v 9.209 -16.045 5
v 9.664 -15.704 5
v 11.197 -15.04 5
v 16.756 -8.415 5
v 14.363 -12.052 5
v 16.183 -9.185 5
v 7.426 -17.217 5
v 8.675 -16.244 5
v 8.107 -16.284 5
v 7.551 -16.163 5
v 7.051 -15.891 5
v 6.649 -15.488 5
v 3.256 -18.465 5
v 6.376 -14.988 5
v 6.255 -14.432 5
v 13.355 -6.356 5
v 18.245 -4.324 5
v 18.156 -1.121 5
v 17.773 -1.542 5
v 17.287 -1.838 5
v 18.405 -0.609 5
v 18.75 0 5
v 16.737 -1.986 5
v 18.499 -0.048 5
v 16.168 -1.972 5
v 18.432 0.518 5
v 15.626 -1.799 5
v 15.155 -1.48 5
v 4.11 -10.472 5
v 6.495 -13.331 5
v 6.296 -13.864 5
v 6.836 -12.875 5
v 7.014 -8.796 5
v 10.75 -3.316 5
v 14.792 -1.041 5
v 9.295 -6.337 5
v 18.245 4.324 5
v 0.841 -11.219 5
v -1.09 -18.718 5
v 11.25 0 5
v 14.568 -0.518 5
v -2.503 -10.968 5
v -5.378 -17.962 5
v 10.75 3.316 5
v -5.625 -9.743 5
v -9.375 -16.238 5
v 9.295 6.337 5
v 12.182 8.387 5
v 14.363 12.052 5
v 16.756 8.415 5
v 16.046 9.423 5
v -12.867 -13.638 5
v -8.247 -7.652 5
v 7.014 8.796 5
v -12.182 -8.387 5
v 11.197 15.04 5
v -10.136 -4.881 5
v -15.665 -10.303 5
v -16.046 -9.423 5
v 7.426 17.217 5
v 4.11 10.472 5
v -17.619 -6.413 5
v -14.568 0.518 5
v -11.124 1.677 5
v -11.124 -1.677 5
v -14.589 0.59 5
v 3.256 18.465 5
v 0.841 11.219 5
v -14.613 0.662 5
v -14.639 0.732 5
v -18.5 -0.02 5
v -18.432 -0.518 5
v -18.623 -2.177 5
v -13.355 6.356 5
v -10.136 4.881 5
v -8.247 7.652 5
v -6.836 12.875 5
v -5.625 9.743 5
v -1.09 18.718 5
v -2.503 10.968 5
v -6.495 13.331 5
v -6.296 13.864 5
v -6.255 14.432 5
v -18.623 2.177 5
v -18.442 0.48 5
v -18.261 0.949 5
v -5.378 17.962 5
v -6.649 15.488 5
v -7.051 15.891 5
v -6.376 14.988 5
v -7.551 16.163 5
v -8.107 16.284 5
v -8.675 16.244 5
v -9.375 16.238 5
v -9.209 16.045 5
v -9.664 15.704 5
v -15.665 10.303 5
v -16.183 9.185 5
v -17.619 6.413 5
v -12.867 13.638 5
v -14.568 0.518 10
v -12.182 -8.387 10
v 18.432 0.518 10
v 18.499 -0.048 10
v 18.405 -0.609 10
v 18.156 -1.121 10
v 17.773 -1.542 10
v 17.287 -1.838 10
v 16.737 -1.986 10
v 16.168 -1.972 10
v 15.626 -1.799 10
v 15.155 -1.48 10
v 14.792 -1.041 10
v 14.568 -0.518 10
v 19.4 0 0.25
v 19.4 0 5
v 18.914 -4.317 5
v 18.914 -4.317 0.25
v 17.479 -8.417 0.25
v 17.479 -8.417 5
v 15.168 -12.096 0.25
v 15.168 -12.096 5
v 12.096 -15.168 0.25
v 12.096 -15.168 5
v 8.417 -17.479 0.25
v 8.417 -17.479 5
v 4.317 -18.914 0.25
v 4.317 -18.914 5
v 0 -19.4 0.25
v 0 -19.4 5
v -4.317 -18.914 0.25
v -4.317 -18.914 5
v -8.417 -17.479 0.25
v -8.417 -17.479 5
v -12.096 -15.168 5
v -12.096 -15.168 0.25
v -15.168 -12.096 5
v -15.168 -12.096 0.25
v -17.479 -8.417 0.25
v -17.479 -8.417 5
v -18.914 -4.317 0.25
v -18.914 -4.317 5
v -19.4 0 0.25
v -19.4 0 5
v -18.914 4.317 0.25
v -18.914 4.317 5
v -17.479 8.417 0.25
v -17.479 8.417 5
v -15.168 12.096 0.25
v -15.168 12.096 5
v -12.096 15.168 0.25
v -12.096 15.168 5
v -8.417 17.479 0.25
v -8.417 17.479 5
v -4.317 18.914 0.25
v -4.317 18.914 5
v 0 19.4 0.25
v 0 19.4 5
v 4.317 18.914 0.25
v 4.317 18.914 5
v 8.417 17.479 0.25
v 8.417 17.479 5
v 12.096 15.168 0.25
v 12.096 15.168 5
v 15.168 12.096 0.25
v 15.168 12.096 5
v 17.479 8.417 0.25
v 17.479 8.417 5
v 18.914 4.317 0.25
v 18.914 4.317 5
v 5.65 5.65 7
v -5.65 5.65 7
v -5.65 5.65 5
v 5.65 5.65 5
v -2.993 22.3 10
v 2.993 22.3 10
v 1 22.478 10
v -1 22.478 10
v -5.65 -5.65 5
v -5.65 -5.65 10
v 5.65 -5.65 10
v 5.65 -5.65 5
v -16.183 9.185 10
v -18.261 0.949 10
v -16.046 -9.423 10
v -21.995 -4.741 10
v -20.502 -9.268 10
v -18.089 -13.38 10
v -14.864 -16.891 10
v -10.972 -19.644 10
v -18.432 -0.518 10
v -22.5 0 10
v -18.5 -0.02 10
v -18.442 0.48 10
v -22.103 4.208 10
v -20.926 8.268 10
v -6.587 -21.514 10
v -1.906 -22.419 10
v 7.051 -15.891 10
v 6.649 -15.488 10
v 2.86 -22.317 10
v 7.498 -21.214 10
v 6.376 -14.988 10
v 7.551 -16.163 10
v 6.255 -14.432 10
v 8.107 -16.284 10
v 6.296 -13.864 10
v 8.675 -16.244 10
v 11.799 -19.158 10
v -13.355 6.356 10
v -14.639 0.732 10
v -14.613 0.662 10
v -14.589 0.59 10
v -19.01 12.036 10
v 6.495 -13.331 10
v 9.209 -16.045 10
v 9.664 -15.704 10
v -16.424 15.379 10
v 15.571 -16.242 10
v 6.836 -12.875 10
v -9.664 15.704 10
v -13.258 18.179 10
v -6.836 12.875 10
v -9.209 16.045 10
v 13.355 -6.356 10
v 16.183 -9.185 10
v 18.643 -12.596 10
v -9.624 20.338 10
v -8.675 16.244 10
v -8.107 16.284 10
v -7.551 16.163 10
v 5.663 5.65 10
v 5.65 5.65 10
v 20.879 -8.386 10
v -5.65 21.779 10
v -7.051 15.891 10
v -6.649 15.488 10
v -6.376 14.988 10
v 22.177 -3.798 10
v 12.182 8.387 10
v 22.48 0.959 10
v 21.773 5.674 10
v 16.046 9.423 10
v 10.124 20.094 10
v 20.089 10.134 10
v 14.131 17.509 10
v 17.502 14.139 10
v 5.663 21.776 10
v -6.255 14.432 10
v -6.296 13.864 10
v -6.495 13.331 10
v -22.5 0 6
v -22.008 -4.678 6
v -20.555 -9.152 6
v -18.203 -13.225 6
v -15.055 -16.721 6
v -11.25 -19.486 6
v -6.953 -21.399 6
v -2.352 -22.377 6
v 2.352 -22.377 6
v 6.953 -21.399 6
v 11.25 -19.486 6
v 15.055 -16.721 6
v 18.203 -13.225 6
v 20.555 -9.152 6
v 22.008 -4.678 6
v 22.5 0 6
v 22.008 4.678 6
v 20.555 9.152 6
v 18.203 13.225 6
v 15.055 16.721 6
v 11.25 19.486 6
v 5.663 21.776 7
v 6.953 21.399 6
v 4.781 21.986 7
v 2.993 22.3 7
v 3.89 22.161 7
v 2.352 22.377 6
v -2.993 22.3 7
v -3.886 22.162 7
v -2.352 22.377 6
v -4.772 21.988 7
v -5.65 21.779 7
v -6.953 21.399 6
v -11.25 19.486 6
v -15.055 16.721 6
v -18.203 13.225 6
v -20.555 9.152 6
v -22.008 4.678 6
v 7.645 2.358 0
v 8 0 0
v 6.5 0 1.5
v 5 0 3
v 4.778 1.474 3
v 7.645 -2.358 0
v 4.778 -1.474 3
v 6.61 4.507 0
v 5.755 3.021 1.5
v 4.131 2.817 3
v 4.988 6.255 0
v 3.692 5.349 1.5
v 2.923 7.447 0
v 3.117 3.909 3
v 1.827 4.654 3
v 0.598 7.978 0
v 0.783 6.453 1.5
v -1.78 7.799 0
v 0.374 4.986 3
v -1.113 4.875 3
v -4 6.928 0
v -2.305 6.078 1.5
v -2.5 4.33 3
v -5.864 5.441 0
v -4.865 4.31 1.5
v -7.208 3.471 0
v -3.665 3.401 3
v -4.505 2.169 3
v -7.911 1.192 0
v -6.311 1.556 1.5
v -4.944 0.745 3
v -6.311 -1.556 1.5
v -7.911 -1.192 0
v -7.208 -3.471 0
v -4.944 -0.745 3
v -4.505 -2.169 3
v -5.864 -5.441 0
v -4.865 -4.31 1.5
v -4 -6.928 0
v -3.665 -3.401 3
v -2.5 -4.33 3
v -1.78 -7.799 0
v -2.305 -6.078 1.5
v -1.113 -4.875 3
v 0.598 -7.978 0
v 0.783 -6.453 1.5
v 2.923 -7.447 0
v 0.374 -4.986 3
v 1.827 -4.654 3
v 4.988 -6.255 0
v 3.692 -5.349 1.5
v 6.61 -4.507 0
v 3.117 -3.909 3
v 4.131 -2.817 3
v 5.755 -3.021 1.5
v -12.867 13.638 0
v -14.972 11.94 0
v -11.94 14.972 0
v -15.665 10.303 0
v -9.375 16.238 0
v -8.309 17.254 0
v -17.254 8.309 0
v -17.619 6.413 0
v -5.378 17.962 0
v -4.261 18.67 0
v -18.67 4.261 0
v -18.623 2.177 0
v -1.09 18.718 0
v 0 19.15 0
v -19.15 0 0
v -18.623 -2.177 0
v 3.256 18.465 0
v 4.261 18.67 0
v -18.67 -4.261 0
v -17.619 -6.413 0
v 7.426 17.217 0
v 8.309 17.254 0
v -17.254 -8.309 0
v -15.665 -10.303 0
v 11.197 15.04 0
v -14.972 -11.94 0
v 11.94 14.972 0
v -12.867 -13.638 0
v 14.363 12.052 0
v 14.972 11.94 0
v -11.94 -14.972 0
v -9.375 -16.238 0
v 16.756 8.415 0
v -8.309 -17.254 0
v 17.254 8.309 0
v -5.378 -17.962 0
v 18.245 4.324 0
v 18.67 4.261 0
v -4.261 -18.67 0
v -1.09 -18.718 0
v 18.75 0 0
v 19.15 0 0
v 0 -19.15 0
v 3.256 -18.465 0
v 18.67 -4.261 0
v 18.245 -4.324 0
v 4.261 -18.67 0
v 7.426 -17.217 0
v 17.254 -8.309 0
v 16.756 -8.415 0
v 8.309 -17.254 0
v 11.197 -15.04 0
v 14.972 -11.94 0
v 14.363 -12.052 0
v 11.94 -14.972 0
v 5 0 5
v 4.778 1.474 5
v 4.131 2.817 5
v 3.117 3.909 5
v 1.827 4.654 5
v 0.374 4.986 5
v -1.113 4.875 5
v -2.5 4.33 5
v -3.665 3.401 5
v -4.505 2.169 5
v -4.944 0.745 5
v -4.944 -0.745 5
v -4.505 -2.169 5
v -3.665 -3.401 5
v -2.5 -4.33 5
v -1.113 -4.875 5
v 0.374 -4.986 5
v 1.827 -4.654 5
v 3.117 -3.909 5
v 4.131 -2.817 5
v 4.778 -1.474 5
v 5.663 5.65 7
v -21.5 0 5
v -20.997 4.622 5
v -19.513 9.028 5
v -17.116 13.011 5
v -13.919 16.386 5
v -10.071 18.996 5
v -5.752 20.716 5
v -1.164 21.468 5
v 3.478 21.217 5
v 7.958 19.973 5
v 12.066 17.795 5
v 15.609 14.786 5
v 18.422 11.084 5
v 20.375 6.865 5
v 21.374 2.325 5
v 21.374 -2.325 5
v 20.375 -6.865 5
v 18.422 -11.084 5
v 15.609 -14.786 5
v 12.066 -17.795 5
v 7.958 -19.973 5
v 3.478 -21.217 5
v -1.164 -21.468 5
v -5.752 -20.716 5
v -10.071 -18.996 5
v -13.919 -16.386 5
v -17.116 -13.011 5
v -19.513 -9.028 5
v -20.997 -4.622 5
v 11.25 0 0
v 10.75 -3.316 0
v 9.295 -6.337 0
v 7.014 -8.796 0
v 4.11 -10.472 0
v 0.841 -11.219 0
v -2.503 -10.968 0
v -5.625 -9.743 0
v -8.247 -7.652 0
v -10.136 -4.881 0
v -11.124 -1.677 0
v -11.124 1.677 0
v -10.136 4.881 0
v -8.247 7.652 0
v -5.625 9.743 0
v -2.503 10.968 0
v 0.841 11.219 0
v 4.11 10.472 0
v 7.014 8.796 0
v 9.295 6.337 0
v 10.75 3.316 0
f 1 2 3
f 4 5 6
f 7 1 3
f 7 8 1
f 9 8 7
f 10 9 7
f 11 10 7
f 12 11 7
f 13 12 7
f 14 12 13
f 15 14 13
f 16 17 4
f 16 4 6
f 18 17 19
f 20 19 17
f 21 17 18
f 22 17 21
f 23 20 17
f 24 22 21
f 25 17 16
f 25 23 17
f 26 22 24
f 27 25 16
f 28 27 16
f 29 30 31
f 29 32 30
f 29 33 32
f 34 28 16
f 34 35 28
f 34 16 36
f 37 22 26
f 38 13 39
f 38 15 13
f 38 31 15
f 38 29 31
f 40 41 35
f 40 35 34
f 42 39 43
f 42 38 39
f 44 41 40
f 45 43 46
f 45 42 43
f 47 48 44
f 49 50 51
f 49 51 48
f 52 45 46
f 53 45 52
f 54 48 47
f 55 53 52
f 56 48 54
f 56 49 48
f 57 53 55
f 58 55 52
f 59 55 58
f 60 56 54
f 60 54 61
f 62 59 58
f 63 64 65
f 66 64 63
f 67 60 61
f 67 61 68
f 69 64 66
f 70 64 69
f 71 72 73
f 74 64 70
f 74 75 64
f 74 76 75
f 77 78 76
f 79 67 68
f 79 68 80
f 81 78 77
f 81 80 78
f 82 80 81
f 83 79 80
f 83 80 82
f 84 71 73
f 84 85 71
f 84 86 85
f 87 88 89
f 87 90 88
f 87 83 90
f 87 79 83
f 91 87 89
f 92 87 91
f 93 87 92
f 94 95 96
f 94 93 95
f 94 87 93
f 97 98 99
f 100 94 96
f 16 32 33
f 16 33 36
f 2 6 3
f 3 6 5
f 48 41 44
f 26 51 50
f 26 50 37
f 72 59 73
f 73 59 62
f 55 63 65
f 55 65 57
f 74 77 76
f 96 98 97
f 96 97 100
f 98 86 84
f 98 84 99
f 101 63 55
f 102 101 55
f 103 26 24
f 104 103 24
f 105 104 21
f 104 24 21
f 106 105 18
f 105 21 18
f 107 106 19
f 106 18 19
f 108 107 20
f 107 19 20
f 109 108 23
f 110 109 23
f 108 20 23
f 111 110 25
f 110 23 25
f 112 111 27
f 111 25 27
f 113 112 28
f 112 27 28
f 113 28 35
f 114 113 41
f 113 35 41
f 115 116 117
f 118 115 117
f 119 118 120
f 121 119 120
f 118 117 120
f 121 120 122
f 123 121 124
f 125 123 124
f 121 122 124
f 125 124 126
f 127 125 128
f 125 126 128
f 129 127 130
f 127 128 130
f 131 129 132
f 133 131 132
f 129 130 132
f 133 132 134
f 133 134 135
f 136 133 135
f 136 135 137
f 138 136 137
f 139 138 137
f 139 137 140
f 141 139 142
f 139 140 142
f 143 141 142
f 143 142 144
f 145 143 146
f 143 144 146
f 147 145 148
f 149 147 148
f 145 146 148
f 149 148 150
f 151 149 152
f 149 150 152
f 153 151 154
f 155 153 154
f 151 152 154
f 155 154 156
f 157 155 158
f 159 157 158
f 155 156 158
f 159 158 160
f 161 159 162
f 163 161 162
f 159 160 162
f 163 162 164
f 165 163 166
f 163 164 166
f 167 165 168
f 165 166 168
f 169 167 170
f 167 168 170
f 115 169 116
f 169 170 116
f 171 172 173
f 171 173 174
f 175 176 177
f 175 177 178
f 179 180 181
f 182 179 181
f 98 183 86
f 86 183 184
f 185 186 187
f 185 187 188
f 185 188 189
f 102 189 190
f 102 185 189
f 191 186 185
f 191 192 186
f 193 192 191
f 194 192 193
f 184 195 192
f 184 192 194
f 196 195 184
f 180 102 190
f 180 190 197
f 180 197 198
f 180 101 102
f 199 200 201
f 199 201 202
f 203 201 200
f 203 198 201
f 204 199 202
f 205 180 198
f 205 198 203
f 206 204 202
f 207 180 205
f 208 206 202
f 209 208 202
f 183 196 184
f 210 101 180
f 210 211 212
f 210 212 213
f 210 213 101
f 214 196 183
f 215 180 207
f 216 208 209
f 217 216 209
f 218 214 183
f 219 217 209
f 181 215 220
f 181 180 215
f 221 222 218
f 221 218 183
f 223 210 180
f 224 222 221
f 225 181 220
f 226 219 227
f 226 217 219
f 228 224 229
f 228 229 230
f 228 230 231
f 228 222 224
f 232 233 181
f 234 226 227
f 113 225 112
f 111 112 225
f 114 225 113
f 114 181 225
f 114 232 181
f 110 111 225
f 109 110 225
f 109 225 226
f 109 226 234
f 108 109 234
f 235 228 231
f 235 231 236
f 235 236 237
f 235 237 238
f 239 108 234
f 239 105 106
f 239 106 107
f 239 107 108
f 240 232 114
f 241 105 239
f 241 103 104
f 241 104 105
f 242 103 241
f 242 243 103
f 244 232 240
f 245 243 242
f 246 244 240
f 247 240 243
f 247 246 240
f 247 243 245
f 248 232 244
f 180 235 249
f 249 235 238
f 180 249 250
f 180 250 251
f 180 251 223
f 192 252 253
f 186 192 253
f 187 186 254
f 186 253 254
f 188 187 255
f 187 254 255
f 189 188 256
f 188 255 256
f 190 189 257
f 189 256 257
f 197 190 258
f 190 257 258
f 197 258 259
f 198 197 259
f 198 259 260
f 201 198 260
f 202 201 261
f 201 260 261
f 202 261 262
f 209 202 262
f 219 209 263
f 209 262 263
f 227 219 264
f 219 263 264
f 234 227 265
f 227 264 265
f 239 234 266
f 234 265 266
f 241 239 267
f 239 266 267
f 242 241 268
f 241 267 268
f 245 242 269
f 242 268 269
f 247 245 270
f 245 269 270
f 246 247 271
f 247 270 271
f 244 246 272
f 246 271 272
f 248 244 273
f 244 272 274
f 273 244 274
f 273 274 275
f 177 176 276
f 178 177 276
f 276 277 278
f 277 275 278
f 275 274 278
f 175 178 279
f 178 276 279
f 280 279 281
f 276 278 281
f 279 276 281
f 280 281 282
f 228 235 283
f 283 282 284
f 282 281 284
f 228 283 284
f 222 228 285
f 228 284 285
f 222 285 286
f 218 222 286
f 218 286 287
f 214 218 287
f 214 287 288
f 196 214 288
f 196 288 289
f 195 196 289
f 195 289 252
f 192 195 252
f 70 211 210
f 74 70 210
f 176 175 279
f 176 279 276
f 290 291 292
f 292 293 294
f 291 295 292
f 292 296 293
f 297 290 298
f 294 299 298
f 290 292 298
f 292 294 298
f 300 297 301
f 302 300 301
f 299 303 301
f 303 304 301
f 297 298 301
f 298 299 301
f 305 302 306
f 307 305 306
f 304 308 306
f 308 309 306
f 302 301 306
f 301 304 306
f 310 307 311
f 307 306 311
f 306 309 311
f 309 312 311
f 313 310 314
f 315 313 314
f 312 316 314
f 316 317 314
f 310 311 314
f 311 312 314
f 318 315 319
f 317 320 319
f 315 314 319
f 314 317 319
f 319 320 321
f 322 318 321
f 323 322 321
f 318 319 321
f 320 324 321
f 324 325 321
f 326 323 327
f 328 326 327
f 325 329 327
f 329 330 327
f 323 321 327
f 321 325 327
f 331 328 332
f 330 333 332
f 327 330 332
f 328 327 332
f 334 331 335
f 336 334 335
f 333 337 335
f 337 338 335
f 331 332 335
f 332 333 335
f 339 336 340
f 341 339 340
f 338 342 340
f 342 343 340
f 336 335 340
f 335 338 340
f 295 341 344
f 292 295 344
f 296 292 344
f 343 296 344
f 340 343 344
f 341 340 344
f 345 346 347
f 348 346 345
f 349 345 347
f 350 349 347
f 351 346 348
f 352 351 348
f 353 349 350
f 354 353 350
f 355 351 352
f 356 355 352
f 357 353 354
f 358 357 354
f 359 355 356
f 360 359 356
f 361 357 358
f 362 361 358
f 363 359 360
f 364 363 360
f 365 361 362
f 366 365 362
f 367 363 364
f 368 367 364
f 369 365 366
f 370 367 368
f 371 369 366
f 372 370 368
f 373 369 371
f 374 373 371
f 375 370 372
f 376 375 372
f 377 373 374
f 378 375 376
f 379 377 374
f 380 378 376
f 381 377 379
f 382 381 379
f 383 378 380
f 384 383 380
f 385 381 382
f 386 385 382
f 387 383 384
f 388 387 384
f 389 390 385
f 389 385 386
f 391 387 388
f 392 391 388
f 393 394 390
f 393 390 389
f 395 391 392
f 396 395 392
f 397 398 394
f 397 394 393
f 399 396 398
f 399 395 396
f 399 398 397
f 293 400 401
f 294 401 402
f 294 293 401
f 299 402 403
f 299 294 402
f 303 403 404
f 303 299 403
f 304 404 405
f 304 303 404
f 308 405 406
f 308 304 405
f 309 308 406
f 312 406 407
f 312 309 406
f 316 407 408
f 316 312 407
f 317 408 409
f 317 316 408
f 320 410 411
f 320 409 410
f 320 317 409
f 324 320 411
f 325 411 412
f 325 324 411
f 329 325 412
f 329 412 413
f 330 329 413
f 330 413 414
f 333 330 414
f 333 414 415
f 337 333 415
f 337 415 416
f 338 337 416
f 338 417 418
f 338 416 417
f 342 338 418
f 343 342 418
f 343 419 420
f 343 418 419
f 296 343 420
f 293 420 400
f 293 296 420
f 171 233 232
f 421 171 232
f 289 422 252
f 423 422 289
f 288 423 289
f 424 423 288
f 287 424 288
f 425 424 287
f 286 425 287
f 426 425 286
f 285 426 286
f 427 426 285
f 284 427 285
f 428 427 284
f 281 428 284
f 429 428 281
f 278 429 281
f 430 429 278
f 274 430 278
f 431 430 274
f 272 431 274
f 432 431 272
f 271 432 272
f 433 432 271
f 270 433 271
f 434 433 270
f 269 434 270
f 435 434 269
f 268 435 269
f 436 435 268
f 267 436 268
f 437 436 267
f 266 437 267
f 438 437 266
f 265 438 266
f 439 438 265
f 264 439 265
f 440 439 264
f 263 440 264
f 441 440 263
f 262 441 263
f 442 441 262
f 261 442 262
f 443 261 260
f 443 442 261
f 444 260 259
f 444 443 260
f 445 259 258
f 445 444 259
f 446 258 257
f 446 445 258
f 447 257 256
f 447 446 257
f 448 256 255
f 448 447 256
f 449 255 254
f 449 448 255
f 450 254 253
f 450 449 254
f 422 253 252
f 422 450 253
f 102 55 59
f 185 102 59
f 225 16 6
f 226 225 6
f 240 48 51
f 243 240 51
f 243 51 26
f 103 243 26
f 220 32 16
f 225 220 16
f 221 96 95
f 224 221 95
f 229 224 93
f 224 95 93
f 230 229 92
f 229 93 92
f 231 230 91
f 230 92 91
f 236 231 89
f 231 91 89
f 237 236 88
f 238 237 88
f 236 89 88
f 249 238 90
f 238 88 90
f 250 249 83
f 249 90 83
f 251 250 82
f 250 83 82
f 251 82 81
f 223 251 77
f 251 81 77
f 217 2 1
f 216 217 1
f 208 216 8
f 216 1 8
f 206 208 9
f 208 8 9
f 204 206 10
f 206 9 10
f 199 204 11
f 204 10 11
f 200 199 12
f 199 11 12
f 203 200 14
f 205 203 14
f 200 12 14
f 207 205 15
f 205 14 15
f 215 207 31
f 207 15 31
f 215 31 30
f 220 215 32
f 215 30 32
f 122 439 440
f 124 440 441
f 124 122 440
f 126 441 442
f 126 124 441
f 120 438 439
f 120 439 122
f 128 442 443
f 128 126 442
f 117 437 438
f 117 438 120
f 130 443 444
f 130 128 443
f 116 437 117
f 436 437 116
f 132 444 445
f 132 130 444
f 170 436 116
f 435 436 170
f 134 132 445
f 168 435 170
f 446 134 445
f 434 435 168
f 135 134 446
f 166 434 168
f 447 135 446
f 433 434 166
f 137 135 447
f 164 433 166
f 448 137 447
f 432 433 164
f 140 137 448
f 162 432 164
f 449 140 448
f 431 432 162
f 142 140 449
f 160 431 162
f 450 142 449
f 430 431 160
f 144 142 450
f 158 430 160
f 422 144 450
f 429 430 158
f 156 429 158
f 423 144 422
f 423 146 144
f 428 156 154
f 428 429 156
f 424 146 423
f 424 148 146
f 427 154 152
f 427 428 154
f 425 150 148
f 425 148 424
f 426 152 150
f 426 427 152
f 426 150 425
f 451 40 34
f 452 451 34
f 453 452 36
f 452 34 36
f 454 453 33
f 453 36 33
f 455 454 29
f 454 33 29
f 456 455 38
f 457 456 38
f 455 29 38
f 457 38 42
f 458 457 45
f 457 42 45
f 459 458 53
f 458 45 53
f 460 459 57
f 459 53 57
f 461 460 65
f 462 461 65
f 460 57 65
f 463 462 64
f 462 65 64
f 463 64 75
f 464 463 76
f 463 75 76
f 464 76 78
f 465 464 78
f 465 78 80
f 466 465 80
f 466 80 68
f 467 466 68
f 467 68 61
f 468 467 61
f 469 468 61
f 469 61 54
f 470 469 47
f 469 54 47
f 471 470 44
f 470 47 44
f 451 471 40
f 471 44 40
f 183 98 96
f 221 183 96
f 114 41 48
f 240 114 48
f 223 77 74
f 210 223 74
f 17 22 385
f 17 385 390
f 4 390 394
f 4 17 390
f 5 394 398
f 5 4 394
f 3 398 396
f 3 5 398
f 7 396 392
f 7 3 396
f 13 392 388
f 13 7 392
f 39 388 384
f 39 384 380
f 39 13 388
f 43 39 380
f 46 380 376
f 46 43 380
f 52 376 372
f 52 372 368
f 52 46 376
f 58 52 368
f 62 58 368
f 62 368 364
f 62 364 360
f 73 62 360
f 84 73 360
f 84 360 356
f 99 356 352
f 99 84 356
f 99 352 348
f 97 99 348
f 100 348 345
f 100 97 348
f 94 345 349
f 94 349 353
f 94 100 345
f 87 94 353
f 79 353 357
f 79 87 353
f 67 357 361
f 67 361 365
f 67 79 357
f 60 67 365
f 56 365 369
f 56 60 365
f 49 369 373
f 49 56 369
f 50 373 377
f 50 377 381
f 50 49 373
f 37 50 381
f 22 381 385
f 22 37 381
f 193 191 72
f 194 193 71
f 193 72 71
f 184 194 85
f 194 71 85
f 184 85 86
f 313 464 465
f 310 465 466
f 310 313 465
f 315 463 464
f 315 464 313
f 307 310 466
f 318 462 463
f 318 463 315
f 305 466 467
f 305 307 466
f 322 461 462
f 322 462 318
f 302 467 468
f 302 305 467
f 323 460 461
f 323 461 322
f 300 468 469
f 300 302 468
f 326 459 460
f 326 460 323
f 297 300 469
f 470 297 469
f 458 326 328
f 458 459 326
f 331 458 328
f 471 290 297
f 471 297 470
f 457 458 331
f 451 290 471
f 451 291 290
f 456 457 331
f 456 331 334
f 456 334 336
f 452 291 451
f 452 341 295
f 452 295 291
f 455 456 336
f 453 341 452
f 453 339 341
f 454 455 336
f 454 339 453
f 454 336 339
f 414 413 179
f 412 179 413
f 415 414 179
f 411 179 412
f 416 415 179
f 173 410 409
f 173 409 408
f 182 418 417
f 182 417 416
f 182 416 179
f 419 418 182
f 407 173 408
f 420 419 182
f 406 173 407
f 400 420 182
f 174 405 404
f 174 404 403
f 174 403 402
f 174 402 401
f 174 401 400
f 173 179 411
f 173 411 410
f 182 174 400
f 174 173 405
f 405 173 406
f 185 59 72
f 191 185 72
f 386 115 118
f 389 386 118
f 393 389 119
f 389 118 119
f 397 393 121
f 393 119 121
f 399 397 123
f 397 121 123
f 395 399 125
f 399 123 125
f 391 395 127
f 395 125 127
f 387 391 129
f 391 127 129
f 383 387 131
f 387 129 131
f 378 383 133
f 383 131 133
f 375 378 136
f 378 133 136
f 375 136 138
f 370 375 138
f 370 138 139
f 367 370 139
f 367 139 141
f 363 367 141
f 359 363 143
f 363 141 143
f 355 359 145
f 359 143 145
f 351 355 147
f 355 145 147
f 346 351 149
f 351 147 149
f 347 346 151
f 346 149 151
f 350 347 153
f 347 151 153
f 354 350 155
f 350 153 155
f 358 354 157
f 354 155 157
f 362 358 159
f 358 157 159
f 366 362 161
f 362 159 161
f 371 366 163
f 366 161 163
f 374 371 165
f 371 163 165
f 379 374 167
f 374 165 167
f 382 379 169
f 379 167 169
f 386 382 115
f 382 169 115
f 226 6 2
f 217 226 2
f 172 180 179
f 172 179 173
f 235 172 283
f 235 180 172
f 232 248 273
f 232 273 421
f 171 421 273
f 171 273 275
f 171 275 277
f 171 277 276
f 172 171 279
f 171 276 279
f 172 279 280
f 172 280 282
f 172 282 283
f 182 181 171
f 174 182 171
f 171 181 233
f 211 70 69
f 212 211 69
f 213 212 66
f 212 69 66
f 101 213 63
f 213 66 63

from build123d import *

# Parameters (mm, degrees)
SKETCH1_R           = 9.8
SKETCH1_R_2         = 5
BOSS_EXTRUDE1_DEPTH = 10
SKETCH2_W           = 11.3
SKETCH2_H           = 11.3
CUT_EXTRUDE1_DEPTH  = 5
SKETCH3_W           = 11.313408722
SKETCH3_H           = 4.707055676
CUT_EXTRUDE2_DEPTH  = 3
SKETCH4_W           = 5.404805584
SKETCH4_H           = 18.076359344
SKETCH4_W_2         = 5.663408722
SKETCH4_H_2         = 17.947057775
CUT_EXTRUDE3_DEPTH  = 3
CHAMFER1_SIZE       = 3
SKETCH5_R           = 22.5
SKETCH5_R_2         = 9.8
BOSS_EXTRUDE2_DEPTH = 1
SKETCH6_R           = 11.25
SKETCH6_R_2         = 9.8
BOSS_EXTRUDE3_DEPTH = 5
SKETCH7_R           = 19.4
SKETCH7_R_2         = 18.75
BOSS_EXTRUDE4_DEPTH = 5
CHAMFER2_SIZE       = 0.25
SKETCH9_R           = 22.5
SKETCH9_R_2         = 9.8
BOSS_EXTRUDE5_DEPTH = 4
SKETCH10_W          = 11.313408722
SKETCH10_H          = 16.65
CUT_EXTRUDE5_DEPTH  = 3
CUT_EXTRUDE4_DEPTH  = 33.210246817
CIRPATTERN1_COUNT   = 6
SKETCH12_W          = 2.936696108
SKETCH12_H          = 13.215132487
SKETCH12_W_2        = 3.332020584
SKETCH12_H_2        = 13.328082337
BOSS_EXTRUDE6_DEPTH = 3
CHAMFER3_SIZE       = 1
CUT_EXTRUDE6_DEPTH  = 10
BOSS_EXTRUDE7_DEPTH = 2
BOSS_EXTRUDE8_DEPTH = 5
BOSS_EXTRUDE9_DEPTH = 5


with BuildPart() as part:
    # Sketch1 → Boss-Extrude1 (new body)
    with BuildSketch(Plane.XY):
        Circle(SKETCH1_R)
        Circle(SKETCH1_R_2, mode=Mode.SUBTRACT)
    extrude(amount=BOSS_EXTRUDE1_DEPTH)

    # Sketch2 → Cut-Extrude1 (cut)
    with BuildSketch(Plane.XY.offset(10)):
        Rectangle(SKETCH2_W, SKETCH2_H)
    extrude(amount=-CUT_EXTRUDE1_DEPTH, mode=Mode.SUBTRACT)

    # Sketch3 → Cut-Extrude2 (cut)
    with BuildSketch(Plane.XY.offset(10)):
        with Locations((0.006704361, 8.003527838)):
            Rectangle(SKETCH3_W, SKETCH3_H)
    extrude(amount=-CUT_EXTRUDE2_DEPTH, mode=Mode.SUBTRACT)

    # Sketch4 → Cut-Extrude3 (cut)
    with BuildSketch(Plane.XY.offset(10)):
        with Locations((-10.5897985, 0)):
            Rectangle(SKETCH4_W, SKETCH4_H)
        with Locations((10.615658814, 0.064650784)):
            Rectangle(SKETCH4_W_2, SKETCH4_H_2)
    extrude(amount=-CUT_EXTRUDE3_DEPTH, mode=Mode.SUBTRACT)

    # Chamfer1
    chamfer1_edges = [part.edges().sort_by_distance(p)[0] for p in [
        (-5, 0, 0),
    ]]
    chamfer(chamfer1_edges, length=CHAMFER1_SIZE)

    # Sketch5 → Boss-Extrude2 (add)
    with BuildSketch(Plane(origin=(0, 0, 5), x_dir=(-1, 0, 0), z_dir=(0, 0, -1))):
        Circle(SKETCH5_R)
        Circle(SKETCH5_R_2, mode=Mode.SUBTRACT)
    extrude(amount=-BOSS_EXTRUDE2_DEPTH)

    # Sketch6 → Boss-Extrude3 (add)
    with BuildSketch(Plane(origin=(0, 0, 5), x_dir=(-1, 0, 0), z_dir=(0, 0, -1))):
        with Locations(Location((0, 0, 0), (0, 0, 180))):
            Circle(SKETCH6_R)
        Circle(SKETCH6_R_2, mode=Mode.SUBTRACT)
    extrude(amount=BOSS_EXTRUDE3_DEPTH)

    # Sketch7 → Boss-Extrude4 (add)
    with BuildSketch(Plane(origin=(0, 0, 5), x_dir=(-1, 0, 0), z_dir=(0, 0, -1))):
        with Locations(Location((0, 0, 0), (0, 0, 180))):
            Circle(SKETCH7_R)
        with Locations(Location((0, 0, 0), (0, 0, 180))):
            Circle(SKETCH7_R_2, mode=Mode.SUBTRACT)
    extrude(amount=BOSS_EXTRUDE4_DEPTH)

    # Chamfer2
    chamfer2_edges = [part.edges().sort_by_distance(p)[0] for p in [
        (-19.4, 0, 0),
    ]]
    chamfer(chamfer2_edges, length=CHAMFER2_SIZE)

    # Sketch9 → Boss-Extrude5 (add)
    with BuildSketch(Plane.XY.offset(6)):
        with Locations(Location((0, 0, 0), (0, 0, 180))):
            Circle(SKETCH9_R)
        Circle(SKETCH9_R_2, mode=Mode.SUBTRACT)
    extrude(amount=BOSS_EXTRUDE5_DEPTH)

    # Sketch10 → Cut-Extrude5 (cut)
    with BuildSketch(Plane.XY.offset(10)):
        with Locations((0.006704361, 13.975)):
            Rectangle(SKETCH10_W, SKETCH10_H)
    extrude(amount=-CUT_EXTRUDE5_DEPTH, mode=Mode.SUBTRACT)

    # Sketch8 → Cut-Extrude4 (cut, through all)
    with BuildSketch(Plane(origin=(0, 0, 5), x_dir=(-1, 0, 0), z_dir=(0, 0, -1))):
        with BuildLine():
            Line((-7.732356662, 12.357593624), (1.172643737, 14.743669758))
            Line((1.172643737, 14.743669758), (0.137372224, 18.607374314))
            Line((0.137372224, 18.607374314), (-8.767628174, 16.22129818))
            ThreePointArc((-8.767628174, 16.22129818), (-10.181844696, 13.771810146), (-7.732356662, 12.357593624))
        make_face()
    cut_extrude4 = extrude(amount=-CUT_EXTRUDE4_DEPTH, mode=Mode.SUBTRACT)

    # CirPattern1: Cut-Extrude4 ×6 about axis
    cirpattern1_axis = Axis((0, 0, 0), (0, 0, 1))
    for i in range(1, CIRPATTERN1_COUNT):
        add(cut_extrude4.rotate(cirpattern1_axis, i * 360 / CIRPATTERN1_COUNT), mode=Mode.SUBTRACT)

    # Sketch12 → Boss-Extrude6 (add)
    with BuildSketch(Plane.XY.offset(7)):
        with Locations((-8.471238773, 0.2258997)):
            Rectangle(SKETCH12_W, SKETCH12_H)
        with Locations((8.555951161, 0.282374626)):
            Rectangle(SKETCH12_W_2, SKETCH12_H_2)
    extrude(amount=BOSS_EXTRUDE6_DEPTH)

    # Chamfer3
    chamfer3_edges = [part.edges().sort_by_distance(p)[0] for p in [
        (22.5, 0, 5),
    ]]
    chamfer(chamfer3_edges, length=CHAMFER3_SIZE)

    # Sketch13 → Cut-Extrude6 (cut)
    with BuildSketch(Plane.XY.offset(10)):
        Polygon((-16.183144966, 9.184719321), (-18.500019366, -1.9936e-05), (-14.638921299, 0.732314676), (-13.354714423, 6.356295613), align=None)
    extrude(amount=-CUT_EXTRUDE6_DEPTH, mode=Mode.SUBTRACT)

    # Sketch14 → Boss-Extrude7 (add)
    with BuildSketch(Plane.XY.offset(7)):
        Polygon((-0.137372224, 18.607374314), (5.663408722, 17.053067256), (5.663408722, 12.911963875), (-1.172643737, 14.743669758), align=None)
    extrude(amount=-BOSS_EXTRUDE7_DEPTH)

    # Sketch15 → Boss-Extrude8 (add)
    with BuildSketch(Plane.XY.offset(10)):
        with BuildLine():
            Line((8.767628174, 16.22129818), (5.663408722, 17.053067256))
            Line((5.663408722, 17.053067256), (5.663408722, 12.911963875))
            Line((5.663408722, 12.911963875), (7.732356662, 12.357593624))
            ThreePointArc((7.732356662, 12.357593624), (10.181844696, 13.771810146), (8.767628174, 16.22129818))
        make_face()
    extrude(amount=-BOSS_EXTRUDE8_DEPTH)

    # Sketch16 → Boss-Extrude9 (add)
    with BuildSketch(Plane.XY.offset(10)):
        with BuildLine():
            Line((-8.767628174, -16.22129818), (0.137372224, -18.607374314))
            Line((0.137372224, -18.607374314), (1.172643737, -14.743669758))
            Line((1.172643737, -14.743669758), (-7.732356662, -12.357593624))
            ThreePointArc((-7.732356662, -12.357593624), (-10.181844696, -13.771810146), (-8.767628174, -16.22129818))
        make_face()
    extrude(amount=-BOSS_EXTRUDE9_DEPTH)


solid = part.part
